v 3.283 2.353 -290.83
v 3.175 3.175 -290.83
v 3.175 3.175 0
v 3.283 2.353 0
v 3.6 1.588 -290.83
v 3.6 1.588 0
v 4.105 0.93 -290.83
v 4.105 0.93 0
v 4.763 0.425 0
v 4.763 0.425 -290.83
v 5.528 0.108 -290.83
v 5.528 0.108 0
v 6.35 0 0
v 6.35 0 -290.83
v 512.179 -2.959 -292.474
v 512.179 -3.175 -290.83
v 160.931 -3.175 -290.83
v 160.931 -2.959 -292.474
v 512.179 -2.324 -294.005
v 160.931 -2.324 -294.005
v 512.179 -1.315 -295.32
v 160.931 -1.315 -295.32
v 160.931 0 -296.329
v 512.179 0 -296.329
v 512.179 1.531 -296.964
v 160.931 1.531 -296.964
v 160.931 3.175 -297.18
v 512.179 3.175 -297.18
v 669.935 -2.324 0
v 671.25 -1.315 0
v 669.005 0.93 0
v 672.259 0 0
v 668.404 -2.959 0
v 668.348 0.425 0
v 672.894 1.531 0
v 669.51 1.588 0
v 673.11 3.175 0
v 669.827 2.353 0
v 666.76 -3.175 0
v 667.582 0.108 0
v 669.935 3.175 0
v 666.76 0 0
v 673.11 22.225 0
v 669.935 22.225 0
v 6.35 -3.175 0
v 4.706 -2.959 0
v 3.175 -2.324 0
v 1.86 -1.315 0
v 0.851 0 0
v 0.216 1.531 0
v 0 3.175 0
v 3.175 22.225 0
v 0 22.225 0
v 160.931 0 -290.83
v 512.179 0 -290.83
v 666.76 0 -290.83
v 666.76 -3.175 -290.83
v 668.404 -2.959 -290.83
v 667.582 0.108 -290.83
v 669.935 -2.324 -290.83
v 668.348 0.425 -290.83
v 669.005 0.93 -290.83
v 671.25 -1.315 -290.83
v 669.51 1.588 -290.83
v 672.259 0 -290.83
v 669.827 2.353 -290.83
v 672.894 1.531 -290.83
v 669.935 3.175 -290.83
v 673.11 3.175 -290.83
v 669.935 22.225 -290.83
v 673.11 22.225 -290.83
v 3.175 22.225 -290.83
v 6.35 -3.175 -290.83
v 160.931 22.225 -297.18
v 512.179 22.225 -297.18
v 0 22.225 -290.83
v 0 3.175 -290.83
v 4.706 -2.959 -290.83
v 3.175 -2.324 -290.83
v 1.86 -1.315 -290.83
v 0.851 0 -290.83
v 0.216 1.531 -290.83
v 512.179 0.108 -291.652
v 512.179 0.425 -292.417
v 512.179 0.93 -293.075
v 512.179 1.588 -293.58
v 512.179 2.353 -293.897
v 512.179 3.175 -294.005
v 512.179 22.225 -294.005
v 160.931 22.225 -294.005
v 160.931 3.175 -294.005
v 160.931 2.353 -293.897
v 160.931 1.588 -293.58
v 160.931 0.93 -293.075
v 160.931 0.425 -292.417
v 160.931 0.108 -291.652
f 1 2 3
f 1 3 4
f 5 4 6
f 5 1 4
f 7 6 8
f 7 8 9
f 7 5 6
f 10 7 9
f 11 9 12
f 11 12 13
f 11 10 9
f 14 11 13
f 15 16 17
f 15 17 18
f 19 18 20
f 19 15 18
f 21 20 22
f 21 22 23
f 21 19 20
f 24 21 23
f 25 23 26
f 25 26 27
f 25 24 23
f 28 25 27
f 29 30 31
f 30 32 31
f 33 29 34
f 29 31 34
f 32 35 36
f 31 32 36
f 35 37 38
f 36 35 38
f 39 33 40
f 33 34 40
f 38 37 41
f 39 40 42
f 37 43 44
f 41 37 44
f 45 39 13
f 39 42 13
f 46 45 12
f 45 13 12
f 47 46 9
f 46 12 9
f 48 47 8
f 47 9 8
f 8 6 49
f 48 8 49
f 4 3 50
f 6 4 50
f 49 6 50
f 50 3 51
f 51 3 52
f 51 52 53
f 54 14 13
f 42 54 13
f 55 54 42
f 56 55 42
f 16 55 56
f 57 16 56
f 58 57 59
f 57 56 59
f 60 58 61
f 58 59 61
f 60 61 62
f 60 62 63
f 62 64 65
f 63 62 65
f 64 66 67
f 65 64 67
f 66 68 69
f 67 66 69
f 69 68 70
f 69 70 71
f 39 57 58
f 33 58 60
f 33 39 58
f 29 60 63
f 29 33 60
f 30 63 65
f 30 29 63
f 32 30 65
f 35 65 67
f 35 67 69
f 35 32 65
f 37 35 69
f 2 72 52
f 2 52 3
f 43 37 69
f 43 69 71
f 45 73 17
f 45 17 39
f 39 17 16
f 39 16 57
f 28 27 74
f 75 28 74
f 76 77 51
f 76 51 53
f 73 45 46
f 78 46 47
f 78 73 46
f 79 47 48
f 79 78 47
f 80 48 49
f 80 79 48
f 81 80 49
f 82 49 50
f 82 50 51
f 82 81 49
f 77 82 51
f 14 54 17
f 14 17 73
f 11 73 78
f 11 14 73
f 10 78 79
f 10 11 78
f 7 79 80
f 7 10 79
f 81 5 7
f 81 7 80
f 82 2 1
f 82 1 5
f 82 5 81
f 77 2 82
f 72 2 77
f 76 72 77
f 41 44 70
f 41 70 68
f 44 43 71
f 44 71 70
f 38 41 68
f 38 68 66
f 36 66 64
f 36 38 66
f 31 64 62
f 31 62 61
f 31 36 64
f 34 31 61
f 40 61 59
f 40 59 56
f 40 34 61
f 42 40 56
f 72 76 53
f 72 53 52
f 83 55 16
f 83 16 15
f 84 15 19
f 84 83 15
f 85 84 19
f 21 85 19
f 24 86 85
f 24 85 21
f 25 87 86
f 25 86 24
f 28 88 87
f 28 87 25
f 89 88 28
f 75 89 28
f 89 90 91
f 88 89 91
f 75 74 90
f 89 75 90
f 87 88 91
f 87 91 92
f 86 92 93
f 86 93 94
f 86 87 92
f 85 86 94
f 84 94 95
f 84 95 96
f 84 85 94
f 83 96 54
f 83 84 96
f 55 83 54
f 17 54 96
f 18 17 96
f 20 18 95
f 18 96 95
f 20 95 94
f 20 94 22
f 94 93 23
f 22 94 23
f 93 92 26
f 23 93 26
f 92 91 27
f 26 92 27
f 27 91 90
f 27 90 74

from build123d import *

# Parameters (mm, degrees)
SKETCH1_W                      = 673.11016
SKETCH1_H                      = 290.83
BASE_FLANGE1_DEPTH             = 3.175
EDGE_FLANGE1_DEPTH             = 351.248800168
EDGE_FLANGE2_STRIP_W           = 19.05
EDGE_FLANGE2_STRIP_H           = 3.175
EDGE_FLANGE2_STRIP_CUT_DEPTH   = 290.83
EDGE_FLANGE2_STRIP_2_W         = 19.05
EDGE_FLANGE2_STRIP_2_H         = 3.175
EDGE_FLANGE2_STRIP_CUT_2_DEPTH = 290.83
EDGE_FLANGE2_DEPTH             = 290.83
EDGE_FLANGE2_BEND_DEPTH        = 290.83


# Sheet-metal steps are written as plain solids
with BuildPart() as part:
    # Sketch1 → Base-Flange1 (new body)
    with BuildSketch(Plane(origin=(0, 0, 0), x_dir=(1, 0, 0), z_dir=(0, 1, 0))):
        with Locations((336.55508, 145.415)):
            Rectangle(SKETCH1_W, SKETCH1_H)
    extrude(amount=-BASE_FLANGE1_DEPTH)

    # Edge-Flange1 section (across the edge) → Edge-Flange1 (add)
    with BuildSketch(Plane(origin=(512.179480084, 0, -294.005), x_dir=(0, 0, 1), z_dir=(-1, 0, 0))):
        with BuildLine():
            Line((-3.175, 3.175), (-3.175, 22.225))
            Line((-3.175, 22.225), (0, 22.225))
            Line((0, 22.225), (0, 3.175))
            ThreePointArc((0, 3.175), (0.92993597, 0.92993597), (3.175, 0))
            Line((3.175, 0), (3.175, -3.175))
            ThreePointArc((3.175, -3.175), (-1.315128061, -1.315128061), (-3.175, 3.175))
        make_face()
    extrude(amount=EDGE_FLANGE1_DEPTH)

    # Edge-Flange2 strip (across the edge) → Edge-Flange2 strip cut (cut)
    with BuildSketch(Plane(origin=(673.11016, 0, 0), x_dir=(-1, 0, 0), z_dir=(0, 0, -1))):
        with Locations((-3.175, -1.5875)):
            Rectangle(EDGE_FLANGE2_STRIP_W, EDGE_FLANGE2_STRIP_H)
    extrude(amount=EDGE_FLANGE2_STRIP_CUT_DEPTH, mode=Mode.SUBTRACT)

    # Edge-Flange2 strip 2 (across the edge) → Edge-Flange2 strip cut 2 (cut)
    with BuildSketch(Plane.XY.offset(-290.83)):
        with Locations((-3.175, -1.5875)):
            Rectangle(EDGE_FLANGE2_STRIP_2_W, EDGE_FLANGE2_STRIP_2_H)
    extrude(amount=EDGE_FLANGE2_STRIP_CUT_2_DEPTH, mode=Mode.SUBTRACT)

    # Edge-Flange2 section (across the edge) → Edge-Flange2 (add)
    with BuildSketch(Plane(origin=(673.11016, 0, 0), x_dir=(-1, 0, 0), z_dir=(0, 0, -1))):
        with BuildLine():
            Line((0, 3.175), (0, 22.225))
            Line((0, 22.225), (3.175, 22.225))
            Line((3.175, 22.225), (3.175, 3.175))
            ThreePointArc((3.175, 3.175), (4.10493597, 0.92993597), (6.35, 0))
            Line((6.35, 0), (6.35, -3.175))
            ThreePointArc((6.35, -3.175), (1.859871939, -1.315128061), (0, 3.175))
        make_face()
    extrude(amount=EDGE_FLANGE2_DEPTH)

    # Edge-Flange2 section 2 (across the edge) → Edge-Flange2 bend (add)
    with BuildSketch(Plane.XY.offset(-290.83)):
        with BuildLine():
            Line((0, 3.175), (0, 22.225))
            Line((0, 22.225), (3.175, 22.225))
            Line((3.175, 22.225), (3.175, 3.175))
            ThreePointArc((3.175, 3.175), (4.10493597, 0.92993597), (6.35, 0))
            Line((6.35, 0), (6.35, -3.175))
            ThreePointArc((6.35, -3.175), (1.859871939, -1.315128061), (0, 3.175))
        make_face()
    extrude(amount=EDGE_FLANGE2_BEND_DEPTH)


solid = part.part
